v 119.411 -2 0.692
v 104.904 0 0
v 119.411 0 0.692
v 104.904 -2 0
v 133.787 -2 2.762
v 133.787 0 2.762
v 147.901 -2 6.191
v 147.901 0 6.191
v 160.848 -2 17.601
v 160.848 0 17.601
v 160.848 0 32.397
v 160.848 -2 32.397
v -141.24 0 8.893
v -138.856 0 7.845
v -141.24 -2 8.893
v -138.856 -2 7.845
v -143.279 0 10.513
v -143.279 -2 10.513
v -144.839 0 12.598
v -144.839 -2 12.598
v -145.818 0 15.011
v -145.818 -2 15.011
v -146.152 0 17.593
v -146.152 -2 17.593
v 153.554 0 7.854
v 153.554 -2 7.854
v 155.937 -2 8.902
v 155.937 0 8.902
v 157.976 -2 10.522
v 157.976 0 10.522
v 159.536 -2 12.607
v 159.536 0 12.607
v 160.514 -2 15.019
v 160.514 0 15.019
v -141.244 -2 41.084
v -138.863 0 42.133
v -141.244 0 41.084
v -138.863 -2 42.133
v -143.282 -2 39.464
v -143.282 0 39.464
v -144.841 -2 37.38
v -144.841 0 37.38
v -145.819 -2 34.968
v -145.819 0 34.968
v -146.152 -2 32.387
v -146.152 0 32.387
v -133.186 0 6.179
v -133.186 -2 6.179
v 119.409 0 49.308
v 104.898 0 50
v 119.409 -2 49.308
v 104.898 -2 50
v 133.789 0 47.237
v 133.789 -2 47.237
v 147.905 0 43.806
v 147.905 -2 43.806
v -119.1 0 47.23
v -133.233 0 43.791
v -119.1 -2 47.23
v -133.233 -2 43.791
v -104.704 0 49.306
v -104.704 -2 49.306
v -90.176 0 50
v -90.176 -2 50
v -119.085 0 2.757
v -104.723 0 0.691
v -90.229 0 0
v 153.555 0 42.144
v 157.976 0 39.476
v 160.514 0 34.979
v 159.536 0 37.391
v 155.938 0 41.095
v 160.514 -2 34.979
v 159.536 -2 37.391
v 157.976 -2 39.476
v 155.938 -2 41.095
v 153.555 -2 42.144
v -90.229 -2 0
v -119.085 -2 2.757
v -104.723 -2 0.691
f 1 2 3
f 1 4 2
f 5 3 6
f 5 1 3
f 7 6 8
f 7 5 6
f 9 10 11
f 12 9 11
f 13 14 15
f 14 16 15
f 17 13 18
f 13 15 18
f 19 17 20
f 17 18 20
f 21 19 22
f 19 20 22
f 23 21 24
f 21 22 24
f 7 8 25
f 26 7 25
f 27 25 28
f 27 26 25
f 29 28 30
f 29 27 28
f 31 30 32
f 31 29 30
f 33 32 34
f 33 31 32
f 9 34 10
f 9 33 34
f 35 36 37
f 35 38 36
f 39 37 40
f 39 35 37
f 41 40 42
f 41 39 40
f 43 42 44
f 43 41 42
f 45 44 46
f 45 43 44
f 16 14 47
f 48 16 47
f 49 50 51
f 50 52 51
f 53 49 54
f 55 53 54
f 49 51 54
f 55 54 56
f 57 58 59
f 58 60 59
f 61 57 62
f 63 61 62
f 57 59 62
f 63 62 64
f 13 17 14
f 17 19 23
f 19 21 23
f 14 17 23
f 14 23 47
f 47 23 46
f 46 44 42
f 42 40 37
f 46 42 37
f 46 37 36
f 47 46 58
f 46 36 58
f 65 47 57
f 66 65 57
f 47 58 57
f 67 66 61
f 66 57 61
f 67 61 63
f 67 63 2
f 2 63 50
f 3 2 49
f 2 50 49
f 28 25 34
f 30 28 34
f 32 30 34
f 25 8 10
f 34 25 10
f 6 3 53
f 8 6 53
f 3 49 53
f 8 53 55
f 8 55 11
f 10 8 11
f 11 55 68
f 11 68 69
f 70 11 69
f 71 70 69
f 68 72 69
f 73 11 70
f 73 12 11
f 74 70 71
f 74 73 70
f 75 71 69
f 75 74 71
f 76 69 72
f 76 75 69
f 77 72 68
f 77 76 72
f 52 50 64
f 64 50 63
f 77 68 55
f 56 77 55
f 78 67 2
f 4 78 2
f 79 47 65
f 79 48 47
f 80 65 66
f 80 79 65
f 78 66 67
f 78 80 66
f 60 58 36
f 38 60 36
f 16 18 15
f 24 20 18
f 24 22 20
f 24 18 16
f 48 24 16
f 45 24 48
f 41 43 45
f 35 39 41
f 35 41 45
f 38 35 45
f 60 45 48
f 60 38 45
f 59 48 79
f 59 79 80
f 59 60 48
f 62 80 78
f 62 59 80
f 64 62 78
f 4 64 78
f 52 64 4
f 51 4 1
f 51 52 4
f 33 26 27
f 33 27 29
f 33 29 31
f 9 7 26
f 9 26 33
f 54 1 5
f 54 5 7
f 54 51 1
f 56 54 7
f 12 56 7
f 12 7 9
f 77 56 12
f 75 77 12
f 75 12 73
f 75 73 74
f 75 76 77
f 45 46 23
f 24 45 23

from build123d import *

# Parameters (mm, degrees)
F1_DEPTH = 2
F2_R     = 10.16
F3_R     = 152.4


with BuildPart() as f1:
    # F0 (on Front) → F1 (new body)
    with BuildSketch(Plane.XZ):
        Polygon((-146.152106, 9.9886), (-112.152106, 0), (126.847894, 0), (160.847894, 9.9987), (160.847894, 39.9987), (126.847894, 50), (-112.152106, 50), (-146.152106, 39.986), align=None)
    extrude(amount=F1_DEPTH)

    # F2
    f2_edges = [f1.edges().sort_by_distance(p)[0] for p in [
        (-146.152106, -1, 39.986),
        (-146.152106, -1, 9.9886),
        (160.847894, -1, 9.9987),
        (160.847894, -1, 39.9987),
    ]]
    fillet(f2_edges, radius=F2_R)

    # F3
    f3_edges = [f1.edges().sort_by_distance(p)[0] for p in [
        (126.847894, -1, 50),
        (126.847894, -1, 0),
        (-112.152106, -1, 50),
        (-112.152106, -1, 0),
    ]]
    fillet(f3_edges, radius=F3_R)


solid = f1.part
